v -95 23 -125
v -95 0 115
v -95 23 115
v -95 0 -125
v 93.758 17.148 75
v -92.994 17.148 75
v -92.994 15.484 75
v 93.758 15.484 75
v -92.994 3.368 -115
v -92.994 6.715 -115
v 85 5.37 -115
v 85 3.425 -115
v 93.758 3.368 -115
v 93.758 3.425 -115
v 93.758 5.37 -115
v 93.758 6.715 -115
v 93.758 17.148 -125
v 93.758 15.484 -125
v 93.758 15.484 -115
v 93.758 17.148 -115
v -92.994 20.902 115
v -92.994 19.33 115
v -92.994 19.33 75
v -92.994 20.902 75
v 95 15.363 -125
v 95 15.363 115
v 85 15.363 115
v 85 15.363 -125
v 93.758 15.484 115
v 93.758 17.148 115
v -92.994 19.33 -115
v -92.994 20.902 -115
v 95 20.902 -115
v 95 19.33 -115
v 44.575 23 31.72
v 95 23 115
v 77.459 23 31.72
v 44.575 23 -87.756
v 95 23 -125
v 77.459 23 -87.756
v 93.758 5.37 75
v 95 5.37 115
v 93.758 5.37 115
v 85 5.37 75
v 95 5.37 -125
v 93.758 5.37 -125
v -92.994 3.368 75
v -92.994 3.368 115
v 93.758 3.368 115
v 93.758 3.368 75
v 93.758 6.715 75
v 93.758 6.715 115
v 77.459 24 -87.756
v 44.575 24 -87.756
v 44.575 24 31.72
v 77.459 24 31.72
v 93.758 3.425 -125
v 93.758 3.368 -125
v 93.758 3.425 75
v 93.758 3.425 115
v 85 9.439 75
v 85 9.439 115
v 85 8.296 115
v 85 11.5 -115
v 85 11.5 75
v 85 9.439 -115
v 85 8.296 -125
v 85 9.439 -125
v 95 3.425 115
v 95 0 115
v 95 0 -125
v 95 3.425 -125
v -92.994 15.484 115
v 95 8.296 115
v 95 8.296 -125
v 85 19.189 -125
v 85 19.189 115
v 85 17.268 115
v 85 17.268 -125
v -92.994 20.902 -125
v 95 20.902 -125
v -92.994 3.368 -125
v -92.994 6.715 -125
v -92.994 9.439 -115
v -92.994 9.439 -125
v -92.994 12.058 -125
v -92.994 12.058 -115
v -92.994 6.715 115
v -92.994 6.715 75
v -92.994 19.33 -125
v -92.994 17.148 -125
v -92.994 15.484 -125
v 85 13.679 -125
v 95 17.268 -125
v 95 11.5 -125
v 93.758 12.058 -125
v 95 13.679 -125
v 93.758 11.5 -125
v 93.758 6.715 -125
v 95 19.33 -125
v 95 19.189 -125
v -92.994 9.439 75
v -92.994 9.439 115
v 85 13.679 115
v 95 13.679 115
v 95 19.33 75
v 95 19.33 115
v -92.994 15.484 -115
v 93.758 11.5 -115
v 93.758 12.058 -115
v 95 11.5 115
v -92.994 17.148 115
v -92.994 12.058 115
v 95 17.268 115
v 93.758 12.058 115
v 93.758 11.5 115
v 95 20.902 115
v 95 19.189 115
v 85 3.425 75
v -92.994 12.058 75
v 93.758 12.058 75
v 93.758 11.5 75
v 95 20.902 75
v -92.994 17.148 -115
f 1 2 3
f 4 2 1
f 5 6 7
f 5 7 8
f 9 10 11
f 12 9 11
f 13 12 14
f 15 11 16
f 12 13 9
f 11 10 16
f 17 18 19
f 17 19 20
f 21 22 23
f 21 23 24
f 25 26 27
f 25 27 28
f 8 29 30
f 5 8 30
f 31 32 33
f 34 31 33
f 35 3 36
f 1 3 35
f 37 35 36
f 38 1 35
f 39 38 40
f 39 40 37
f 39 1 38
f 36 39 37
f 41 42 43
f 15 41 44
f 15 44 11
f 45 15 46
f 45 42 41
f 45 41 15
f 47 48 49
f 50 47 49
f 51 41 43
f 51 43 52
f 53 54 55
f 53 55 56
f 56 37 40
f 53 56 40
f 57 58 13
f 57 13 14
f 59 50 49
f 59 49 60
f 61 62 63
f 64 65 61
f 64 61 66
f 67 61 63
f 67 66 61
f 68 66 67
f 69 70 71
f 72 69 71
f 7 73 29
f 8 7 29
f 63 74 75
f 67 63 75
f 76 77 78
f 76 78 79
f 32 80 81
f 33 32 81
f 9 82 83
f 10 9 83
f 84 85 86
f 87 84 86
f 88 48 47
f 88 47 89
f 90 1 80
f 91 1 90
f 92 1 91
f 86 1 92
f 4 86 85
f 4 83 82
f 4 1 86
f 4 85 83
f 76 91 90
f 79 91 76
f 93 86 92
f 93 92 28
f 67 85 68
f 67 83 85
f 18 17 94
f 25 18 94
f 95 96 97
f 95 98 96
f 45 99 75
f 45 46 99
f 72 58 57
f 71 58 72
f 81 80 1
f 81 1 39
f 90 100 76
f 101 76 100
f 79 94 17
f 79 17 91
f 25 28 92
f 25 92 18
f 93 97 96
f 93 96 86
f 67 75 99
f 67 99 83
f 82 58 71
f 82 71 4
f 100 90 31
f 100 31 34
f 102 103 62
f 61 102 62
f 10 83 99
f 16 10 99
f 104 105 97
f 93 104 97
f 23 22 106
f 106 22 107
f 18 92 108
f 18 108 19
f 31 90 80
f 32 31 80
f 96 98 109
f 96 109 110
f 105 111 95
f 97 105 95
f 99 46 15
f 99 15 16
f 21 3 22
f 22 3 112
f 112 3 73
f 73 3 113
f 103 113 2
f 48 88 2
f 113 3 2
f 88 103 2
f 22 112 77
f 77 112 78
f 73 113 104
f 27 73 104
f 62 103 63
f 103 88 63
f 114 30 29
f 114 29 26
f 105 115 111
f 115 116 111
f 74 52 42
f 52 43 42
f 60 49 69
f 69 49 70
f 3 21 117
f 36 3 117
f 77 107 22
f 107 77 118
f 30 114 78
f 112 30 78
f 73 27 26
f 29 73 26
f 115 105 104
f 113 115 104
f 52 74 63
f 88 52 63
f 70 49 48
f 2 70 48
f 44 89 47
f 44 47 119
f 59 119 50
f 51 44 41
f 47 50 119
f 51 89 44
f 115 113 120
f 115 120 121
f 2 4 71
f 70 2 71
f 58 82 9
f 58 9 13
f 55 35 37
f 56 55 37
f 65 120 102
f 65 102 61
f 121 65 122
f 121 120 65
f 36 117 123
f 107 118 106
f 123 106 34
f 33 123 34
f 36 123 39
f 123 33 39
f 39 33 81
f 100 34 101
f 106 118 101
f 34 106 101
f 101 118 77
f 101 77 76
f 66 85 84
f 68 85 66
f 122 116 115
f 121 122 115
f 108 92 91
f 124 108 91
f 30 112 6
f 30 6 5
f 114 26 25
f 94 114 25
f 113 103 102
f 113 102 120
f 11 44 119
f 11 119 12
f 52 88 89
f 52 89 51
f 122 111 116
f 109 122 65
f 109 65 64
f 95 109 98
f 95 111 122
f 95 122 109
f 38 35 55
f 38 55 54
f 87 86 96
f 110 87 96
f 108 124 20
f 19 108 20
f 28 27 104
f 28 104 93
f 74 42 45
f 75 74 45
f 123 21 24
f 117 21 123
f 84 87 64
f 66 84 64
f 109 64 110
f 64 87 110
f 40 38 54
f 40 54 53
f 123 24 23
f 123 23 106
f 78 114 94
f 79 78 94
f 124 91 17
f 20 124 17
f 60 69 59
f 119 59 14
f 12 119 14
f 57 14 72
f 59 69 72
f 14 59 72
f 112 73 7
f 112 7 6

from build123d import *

# Parameters (mm, degrees)
SKETCH_1_W          = 190
SKETCH_1_H          = 240
EXTRUDE_1_DEPTH     = 23
SKETCH_2_W          = 244.953894582
SKETCH_2_H          = 1.92087839
SKETCH_2_W_2        = 245.721377573
SKETCH_2_H_2        = 1.683754508
SKETCH_2_W_3        = 244.530855974
SKETCH_2_H_3        = 3.204341319
SKETCH_2_W_4        = 243.54031242
SKETCH_2_H_4        = 1.944573874
CUT_EXTRUDE_1_DEPTH = 10
SKETCH_3_W          = 187.993982421
SKETCH_3_H          = 1.571683417
SKETCH_3_W_2        = 186.752481484
SKETCH_3_H_2        = 1.663815778
SKETCH_3_H_3        = 2.618871028
SKETCH_3_H_4        = 3.346100481
CUT_EXTRUDE_2_DEPTH = 40
SKETCH_10_W         = 32.883336007
SKETCH_10_H         = 119.476120829
EXTRUDE_2_DEPTH     = 1


with BuildPart() as part:
    # 草图1 → 凸台-拉伸1 (new body)
    with BuildSketch(Plane(origin=(0, 0, 0), x_dir=(1, 0, 0), z_dir=(0, 1, 0))):
        with Locations((0, 5)):
            Rectangle(SKETCH_1_W, SKETCH_1_H)
    extrude(amount=EXTRUDE_1_DEPTH)

    # 草图2 → 切除-拉伸1 (cut)
    with BuildSketch(Plane(origin=(95, 0, 0), x_dir=(0, 0, -1), z_dir=(1, 0, 0))):
        with Locations((6.062274081, 18.228253569)):
            Rectangle(SKETCH_2_W, SKETCH_2_H)
        with Locations((6.148753652, 14.520829351)):
            Rectangle(SKETCH_2_W_2, SKETCH_2_H_2)
        with Locations((5.553492852, 9.89782934)):
            Rectangle(SKETCH_2_W_3, SKETCH_2_H_3)
        with Locations((5.313676242, 4.397346814)):
            Rectangle(SKETCH_2_W_4, SKETCH_2_H_4)
    extrude(amount=-CUT_EXTRUDE_1_DEPTH, mode=Mode.SUBTRACT)

    # 草图3 → 切除-拉伸2 (cut)
    with BuildSketch(Plane.XY.offset(115)):
        with Locations((1.003008789, 20.115789148)):
            Rectangle(SKETCH_3_W, SKETCH_3_H)
        with Locations((0.382258321, 16.316351191)):
            Rectangle(SKETCH_3_W_2, SKETCH_3_H_2)
        with Locations((0.382258321, 10.748217394)):
            Rectangle(SKETCH_3_W_2, SKETCH_3_H_3)
        with Locations((0.382258321, 5.041481802)):
            Rectangle(SKETCH_3_W_2, SKETCH_3_H_4)
    cut_extrude_2 = extrude(amount=-CUT_EXTRUDE_2_DEPTH, mode=Mode.SUBTRACT)

    # 镜向3: 切除-拉伸2 across plane
    add(cut_extrude_2.mirror(Plane.XY.offset(-20)), mode=Mode.SUBTRACT)

    # 草图10 → 凸台-拉伸2 (add)
    with BuildSketch(Plane(origin=(0, 23, 0), x_dir=(1, 0, 0), z_dir=(0, 1, 0))):
        with Locations((61.016856815, 28.018335206)):
            Rectangle(SKETCH_10_W, SKETCH_10_H)
    extrude(amount=EXTRUDE_2_DEPTH)


solid = part.part
